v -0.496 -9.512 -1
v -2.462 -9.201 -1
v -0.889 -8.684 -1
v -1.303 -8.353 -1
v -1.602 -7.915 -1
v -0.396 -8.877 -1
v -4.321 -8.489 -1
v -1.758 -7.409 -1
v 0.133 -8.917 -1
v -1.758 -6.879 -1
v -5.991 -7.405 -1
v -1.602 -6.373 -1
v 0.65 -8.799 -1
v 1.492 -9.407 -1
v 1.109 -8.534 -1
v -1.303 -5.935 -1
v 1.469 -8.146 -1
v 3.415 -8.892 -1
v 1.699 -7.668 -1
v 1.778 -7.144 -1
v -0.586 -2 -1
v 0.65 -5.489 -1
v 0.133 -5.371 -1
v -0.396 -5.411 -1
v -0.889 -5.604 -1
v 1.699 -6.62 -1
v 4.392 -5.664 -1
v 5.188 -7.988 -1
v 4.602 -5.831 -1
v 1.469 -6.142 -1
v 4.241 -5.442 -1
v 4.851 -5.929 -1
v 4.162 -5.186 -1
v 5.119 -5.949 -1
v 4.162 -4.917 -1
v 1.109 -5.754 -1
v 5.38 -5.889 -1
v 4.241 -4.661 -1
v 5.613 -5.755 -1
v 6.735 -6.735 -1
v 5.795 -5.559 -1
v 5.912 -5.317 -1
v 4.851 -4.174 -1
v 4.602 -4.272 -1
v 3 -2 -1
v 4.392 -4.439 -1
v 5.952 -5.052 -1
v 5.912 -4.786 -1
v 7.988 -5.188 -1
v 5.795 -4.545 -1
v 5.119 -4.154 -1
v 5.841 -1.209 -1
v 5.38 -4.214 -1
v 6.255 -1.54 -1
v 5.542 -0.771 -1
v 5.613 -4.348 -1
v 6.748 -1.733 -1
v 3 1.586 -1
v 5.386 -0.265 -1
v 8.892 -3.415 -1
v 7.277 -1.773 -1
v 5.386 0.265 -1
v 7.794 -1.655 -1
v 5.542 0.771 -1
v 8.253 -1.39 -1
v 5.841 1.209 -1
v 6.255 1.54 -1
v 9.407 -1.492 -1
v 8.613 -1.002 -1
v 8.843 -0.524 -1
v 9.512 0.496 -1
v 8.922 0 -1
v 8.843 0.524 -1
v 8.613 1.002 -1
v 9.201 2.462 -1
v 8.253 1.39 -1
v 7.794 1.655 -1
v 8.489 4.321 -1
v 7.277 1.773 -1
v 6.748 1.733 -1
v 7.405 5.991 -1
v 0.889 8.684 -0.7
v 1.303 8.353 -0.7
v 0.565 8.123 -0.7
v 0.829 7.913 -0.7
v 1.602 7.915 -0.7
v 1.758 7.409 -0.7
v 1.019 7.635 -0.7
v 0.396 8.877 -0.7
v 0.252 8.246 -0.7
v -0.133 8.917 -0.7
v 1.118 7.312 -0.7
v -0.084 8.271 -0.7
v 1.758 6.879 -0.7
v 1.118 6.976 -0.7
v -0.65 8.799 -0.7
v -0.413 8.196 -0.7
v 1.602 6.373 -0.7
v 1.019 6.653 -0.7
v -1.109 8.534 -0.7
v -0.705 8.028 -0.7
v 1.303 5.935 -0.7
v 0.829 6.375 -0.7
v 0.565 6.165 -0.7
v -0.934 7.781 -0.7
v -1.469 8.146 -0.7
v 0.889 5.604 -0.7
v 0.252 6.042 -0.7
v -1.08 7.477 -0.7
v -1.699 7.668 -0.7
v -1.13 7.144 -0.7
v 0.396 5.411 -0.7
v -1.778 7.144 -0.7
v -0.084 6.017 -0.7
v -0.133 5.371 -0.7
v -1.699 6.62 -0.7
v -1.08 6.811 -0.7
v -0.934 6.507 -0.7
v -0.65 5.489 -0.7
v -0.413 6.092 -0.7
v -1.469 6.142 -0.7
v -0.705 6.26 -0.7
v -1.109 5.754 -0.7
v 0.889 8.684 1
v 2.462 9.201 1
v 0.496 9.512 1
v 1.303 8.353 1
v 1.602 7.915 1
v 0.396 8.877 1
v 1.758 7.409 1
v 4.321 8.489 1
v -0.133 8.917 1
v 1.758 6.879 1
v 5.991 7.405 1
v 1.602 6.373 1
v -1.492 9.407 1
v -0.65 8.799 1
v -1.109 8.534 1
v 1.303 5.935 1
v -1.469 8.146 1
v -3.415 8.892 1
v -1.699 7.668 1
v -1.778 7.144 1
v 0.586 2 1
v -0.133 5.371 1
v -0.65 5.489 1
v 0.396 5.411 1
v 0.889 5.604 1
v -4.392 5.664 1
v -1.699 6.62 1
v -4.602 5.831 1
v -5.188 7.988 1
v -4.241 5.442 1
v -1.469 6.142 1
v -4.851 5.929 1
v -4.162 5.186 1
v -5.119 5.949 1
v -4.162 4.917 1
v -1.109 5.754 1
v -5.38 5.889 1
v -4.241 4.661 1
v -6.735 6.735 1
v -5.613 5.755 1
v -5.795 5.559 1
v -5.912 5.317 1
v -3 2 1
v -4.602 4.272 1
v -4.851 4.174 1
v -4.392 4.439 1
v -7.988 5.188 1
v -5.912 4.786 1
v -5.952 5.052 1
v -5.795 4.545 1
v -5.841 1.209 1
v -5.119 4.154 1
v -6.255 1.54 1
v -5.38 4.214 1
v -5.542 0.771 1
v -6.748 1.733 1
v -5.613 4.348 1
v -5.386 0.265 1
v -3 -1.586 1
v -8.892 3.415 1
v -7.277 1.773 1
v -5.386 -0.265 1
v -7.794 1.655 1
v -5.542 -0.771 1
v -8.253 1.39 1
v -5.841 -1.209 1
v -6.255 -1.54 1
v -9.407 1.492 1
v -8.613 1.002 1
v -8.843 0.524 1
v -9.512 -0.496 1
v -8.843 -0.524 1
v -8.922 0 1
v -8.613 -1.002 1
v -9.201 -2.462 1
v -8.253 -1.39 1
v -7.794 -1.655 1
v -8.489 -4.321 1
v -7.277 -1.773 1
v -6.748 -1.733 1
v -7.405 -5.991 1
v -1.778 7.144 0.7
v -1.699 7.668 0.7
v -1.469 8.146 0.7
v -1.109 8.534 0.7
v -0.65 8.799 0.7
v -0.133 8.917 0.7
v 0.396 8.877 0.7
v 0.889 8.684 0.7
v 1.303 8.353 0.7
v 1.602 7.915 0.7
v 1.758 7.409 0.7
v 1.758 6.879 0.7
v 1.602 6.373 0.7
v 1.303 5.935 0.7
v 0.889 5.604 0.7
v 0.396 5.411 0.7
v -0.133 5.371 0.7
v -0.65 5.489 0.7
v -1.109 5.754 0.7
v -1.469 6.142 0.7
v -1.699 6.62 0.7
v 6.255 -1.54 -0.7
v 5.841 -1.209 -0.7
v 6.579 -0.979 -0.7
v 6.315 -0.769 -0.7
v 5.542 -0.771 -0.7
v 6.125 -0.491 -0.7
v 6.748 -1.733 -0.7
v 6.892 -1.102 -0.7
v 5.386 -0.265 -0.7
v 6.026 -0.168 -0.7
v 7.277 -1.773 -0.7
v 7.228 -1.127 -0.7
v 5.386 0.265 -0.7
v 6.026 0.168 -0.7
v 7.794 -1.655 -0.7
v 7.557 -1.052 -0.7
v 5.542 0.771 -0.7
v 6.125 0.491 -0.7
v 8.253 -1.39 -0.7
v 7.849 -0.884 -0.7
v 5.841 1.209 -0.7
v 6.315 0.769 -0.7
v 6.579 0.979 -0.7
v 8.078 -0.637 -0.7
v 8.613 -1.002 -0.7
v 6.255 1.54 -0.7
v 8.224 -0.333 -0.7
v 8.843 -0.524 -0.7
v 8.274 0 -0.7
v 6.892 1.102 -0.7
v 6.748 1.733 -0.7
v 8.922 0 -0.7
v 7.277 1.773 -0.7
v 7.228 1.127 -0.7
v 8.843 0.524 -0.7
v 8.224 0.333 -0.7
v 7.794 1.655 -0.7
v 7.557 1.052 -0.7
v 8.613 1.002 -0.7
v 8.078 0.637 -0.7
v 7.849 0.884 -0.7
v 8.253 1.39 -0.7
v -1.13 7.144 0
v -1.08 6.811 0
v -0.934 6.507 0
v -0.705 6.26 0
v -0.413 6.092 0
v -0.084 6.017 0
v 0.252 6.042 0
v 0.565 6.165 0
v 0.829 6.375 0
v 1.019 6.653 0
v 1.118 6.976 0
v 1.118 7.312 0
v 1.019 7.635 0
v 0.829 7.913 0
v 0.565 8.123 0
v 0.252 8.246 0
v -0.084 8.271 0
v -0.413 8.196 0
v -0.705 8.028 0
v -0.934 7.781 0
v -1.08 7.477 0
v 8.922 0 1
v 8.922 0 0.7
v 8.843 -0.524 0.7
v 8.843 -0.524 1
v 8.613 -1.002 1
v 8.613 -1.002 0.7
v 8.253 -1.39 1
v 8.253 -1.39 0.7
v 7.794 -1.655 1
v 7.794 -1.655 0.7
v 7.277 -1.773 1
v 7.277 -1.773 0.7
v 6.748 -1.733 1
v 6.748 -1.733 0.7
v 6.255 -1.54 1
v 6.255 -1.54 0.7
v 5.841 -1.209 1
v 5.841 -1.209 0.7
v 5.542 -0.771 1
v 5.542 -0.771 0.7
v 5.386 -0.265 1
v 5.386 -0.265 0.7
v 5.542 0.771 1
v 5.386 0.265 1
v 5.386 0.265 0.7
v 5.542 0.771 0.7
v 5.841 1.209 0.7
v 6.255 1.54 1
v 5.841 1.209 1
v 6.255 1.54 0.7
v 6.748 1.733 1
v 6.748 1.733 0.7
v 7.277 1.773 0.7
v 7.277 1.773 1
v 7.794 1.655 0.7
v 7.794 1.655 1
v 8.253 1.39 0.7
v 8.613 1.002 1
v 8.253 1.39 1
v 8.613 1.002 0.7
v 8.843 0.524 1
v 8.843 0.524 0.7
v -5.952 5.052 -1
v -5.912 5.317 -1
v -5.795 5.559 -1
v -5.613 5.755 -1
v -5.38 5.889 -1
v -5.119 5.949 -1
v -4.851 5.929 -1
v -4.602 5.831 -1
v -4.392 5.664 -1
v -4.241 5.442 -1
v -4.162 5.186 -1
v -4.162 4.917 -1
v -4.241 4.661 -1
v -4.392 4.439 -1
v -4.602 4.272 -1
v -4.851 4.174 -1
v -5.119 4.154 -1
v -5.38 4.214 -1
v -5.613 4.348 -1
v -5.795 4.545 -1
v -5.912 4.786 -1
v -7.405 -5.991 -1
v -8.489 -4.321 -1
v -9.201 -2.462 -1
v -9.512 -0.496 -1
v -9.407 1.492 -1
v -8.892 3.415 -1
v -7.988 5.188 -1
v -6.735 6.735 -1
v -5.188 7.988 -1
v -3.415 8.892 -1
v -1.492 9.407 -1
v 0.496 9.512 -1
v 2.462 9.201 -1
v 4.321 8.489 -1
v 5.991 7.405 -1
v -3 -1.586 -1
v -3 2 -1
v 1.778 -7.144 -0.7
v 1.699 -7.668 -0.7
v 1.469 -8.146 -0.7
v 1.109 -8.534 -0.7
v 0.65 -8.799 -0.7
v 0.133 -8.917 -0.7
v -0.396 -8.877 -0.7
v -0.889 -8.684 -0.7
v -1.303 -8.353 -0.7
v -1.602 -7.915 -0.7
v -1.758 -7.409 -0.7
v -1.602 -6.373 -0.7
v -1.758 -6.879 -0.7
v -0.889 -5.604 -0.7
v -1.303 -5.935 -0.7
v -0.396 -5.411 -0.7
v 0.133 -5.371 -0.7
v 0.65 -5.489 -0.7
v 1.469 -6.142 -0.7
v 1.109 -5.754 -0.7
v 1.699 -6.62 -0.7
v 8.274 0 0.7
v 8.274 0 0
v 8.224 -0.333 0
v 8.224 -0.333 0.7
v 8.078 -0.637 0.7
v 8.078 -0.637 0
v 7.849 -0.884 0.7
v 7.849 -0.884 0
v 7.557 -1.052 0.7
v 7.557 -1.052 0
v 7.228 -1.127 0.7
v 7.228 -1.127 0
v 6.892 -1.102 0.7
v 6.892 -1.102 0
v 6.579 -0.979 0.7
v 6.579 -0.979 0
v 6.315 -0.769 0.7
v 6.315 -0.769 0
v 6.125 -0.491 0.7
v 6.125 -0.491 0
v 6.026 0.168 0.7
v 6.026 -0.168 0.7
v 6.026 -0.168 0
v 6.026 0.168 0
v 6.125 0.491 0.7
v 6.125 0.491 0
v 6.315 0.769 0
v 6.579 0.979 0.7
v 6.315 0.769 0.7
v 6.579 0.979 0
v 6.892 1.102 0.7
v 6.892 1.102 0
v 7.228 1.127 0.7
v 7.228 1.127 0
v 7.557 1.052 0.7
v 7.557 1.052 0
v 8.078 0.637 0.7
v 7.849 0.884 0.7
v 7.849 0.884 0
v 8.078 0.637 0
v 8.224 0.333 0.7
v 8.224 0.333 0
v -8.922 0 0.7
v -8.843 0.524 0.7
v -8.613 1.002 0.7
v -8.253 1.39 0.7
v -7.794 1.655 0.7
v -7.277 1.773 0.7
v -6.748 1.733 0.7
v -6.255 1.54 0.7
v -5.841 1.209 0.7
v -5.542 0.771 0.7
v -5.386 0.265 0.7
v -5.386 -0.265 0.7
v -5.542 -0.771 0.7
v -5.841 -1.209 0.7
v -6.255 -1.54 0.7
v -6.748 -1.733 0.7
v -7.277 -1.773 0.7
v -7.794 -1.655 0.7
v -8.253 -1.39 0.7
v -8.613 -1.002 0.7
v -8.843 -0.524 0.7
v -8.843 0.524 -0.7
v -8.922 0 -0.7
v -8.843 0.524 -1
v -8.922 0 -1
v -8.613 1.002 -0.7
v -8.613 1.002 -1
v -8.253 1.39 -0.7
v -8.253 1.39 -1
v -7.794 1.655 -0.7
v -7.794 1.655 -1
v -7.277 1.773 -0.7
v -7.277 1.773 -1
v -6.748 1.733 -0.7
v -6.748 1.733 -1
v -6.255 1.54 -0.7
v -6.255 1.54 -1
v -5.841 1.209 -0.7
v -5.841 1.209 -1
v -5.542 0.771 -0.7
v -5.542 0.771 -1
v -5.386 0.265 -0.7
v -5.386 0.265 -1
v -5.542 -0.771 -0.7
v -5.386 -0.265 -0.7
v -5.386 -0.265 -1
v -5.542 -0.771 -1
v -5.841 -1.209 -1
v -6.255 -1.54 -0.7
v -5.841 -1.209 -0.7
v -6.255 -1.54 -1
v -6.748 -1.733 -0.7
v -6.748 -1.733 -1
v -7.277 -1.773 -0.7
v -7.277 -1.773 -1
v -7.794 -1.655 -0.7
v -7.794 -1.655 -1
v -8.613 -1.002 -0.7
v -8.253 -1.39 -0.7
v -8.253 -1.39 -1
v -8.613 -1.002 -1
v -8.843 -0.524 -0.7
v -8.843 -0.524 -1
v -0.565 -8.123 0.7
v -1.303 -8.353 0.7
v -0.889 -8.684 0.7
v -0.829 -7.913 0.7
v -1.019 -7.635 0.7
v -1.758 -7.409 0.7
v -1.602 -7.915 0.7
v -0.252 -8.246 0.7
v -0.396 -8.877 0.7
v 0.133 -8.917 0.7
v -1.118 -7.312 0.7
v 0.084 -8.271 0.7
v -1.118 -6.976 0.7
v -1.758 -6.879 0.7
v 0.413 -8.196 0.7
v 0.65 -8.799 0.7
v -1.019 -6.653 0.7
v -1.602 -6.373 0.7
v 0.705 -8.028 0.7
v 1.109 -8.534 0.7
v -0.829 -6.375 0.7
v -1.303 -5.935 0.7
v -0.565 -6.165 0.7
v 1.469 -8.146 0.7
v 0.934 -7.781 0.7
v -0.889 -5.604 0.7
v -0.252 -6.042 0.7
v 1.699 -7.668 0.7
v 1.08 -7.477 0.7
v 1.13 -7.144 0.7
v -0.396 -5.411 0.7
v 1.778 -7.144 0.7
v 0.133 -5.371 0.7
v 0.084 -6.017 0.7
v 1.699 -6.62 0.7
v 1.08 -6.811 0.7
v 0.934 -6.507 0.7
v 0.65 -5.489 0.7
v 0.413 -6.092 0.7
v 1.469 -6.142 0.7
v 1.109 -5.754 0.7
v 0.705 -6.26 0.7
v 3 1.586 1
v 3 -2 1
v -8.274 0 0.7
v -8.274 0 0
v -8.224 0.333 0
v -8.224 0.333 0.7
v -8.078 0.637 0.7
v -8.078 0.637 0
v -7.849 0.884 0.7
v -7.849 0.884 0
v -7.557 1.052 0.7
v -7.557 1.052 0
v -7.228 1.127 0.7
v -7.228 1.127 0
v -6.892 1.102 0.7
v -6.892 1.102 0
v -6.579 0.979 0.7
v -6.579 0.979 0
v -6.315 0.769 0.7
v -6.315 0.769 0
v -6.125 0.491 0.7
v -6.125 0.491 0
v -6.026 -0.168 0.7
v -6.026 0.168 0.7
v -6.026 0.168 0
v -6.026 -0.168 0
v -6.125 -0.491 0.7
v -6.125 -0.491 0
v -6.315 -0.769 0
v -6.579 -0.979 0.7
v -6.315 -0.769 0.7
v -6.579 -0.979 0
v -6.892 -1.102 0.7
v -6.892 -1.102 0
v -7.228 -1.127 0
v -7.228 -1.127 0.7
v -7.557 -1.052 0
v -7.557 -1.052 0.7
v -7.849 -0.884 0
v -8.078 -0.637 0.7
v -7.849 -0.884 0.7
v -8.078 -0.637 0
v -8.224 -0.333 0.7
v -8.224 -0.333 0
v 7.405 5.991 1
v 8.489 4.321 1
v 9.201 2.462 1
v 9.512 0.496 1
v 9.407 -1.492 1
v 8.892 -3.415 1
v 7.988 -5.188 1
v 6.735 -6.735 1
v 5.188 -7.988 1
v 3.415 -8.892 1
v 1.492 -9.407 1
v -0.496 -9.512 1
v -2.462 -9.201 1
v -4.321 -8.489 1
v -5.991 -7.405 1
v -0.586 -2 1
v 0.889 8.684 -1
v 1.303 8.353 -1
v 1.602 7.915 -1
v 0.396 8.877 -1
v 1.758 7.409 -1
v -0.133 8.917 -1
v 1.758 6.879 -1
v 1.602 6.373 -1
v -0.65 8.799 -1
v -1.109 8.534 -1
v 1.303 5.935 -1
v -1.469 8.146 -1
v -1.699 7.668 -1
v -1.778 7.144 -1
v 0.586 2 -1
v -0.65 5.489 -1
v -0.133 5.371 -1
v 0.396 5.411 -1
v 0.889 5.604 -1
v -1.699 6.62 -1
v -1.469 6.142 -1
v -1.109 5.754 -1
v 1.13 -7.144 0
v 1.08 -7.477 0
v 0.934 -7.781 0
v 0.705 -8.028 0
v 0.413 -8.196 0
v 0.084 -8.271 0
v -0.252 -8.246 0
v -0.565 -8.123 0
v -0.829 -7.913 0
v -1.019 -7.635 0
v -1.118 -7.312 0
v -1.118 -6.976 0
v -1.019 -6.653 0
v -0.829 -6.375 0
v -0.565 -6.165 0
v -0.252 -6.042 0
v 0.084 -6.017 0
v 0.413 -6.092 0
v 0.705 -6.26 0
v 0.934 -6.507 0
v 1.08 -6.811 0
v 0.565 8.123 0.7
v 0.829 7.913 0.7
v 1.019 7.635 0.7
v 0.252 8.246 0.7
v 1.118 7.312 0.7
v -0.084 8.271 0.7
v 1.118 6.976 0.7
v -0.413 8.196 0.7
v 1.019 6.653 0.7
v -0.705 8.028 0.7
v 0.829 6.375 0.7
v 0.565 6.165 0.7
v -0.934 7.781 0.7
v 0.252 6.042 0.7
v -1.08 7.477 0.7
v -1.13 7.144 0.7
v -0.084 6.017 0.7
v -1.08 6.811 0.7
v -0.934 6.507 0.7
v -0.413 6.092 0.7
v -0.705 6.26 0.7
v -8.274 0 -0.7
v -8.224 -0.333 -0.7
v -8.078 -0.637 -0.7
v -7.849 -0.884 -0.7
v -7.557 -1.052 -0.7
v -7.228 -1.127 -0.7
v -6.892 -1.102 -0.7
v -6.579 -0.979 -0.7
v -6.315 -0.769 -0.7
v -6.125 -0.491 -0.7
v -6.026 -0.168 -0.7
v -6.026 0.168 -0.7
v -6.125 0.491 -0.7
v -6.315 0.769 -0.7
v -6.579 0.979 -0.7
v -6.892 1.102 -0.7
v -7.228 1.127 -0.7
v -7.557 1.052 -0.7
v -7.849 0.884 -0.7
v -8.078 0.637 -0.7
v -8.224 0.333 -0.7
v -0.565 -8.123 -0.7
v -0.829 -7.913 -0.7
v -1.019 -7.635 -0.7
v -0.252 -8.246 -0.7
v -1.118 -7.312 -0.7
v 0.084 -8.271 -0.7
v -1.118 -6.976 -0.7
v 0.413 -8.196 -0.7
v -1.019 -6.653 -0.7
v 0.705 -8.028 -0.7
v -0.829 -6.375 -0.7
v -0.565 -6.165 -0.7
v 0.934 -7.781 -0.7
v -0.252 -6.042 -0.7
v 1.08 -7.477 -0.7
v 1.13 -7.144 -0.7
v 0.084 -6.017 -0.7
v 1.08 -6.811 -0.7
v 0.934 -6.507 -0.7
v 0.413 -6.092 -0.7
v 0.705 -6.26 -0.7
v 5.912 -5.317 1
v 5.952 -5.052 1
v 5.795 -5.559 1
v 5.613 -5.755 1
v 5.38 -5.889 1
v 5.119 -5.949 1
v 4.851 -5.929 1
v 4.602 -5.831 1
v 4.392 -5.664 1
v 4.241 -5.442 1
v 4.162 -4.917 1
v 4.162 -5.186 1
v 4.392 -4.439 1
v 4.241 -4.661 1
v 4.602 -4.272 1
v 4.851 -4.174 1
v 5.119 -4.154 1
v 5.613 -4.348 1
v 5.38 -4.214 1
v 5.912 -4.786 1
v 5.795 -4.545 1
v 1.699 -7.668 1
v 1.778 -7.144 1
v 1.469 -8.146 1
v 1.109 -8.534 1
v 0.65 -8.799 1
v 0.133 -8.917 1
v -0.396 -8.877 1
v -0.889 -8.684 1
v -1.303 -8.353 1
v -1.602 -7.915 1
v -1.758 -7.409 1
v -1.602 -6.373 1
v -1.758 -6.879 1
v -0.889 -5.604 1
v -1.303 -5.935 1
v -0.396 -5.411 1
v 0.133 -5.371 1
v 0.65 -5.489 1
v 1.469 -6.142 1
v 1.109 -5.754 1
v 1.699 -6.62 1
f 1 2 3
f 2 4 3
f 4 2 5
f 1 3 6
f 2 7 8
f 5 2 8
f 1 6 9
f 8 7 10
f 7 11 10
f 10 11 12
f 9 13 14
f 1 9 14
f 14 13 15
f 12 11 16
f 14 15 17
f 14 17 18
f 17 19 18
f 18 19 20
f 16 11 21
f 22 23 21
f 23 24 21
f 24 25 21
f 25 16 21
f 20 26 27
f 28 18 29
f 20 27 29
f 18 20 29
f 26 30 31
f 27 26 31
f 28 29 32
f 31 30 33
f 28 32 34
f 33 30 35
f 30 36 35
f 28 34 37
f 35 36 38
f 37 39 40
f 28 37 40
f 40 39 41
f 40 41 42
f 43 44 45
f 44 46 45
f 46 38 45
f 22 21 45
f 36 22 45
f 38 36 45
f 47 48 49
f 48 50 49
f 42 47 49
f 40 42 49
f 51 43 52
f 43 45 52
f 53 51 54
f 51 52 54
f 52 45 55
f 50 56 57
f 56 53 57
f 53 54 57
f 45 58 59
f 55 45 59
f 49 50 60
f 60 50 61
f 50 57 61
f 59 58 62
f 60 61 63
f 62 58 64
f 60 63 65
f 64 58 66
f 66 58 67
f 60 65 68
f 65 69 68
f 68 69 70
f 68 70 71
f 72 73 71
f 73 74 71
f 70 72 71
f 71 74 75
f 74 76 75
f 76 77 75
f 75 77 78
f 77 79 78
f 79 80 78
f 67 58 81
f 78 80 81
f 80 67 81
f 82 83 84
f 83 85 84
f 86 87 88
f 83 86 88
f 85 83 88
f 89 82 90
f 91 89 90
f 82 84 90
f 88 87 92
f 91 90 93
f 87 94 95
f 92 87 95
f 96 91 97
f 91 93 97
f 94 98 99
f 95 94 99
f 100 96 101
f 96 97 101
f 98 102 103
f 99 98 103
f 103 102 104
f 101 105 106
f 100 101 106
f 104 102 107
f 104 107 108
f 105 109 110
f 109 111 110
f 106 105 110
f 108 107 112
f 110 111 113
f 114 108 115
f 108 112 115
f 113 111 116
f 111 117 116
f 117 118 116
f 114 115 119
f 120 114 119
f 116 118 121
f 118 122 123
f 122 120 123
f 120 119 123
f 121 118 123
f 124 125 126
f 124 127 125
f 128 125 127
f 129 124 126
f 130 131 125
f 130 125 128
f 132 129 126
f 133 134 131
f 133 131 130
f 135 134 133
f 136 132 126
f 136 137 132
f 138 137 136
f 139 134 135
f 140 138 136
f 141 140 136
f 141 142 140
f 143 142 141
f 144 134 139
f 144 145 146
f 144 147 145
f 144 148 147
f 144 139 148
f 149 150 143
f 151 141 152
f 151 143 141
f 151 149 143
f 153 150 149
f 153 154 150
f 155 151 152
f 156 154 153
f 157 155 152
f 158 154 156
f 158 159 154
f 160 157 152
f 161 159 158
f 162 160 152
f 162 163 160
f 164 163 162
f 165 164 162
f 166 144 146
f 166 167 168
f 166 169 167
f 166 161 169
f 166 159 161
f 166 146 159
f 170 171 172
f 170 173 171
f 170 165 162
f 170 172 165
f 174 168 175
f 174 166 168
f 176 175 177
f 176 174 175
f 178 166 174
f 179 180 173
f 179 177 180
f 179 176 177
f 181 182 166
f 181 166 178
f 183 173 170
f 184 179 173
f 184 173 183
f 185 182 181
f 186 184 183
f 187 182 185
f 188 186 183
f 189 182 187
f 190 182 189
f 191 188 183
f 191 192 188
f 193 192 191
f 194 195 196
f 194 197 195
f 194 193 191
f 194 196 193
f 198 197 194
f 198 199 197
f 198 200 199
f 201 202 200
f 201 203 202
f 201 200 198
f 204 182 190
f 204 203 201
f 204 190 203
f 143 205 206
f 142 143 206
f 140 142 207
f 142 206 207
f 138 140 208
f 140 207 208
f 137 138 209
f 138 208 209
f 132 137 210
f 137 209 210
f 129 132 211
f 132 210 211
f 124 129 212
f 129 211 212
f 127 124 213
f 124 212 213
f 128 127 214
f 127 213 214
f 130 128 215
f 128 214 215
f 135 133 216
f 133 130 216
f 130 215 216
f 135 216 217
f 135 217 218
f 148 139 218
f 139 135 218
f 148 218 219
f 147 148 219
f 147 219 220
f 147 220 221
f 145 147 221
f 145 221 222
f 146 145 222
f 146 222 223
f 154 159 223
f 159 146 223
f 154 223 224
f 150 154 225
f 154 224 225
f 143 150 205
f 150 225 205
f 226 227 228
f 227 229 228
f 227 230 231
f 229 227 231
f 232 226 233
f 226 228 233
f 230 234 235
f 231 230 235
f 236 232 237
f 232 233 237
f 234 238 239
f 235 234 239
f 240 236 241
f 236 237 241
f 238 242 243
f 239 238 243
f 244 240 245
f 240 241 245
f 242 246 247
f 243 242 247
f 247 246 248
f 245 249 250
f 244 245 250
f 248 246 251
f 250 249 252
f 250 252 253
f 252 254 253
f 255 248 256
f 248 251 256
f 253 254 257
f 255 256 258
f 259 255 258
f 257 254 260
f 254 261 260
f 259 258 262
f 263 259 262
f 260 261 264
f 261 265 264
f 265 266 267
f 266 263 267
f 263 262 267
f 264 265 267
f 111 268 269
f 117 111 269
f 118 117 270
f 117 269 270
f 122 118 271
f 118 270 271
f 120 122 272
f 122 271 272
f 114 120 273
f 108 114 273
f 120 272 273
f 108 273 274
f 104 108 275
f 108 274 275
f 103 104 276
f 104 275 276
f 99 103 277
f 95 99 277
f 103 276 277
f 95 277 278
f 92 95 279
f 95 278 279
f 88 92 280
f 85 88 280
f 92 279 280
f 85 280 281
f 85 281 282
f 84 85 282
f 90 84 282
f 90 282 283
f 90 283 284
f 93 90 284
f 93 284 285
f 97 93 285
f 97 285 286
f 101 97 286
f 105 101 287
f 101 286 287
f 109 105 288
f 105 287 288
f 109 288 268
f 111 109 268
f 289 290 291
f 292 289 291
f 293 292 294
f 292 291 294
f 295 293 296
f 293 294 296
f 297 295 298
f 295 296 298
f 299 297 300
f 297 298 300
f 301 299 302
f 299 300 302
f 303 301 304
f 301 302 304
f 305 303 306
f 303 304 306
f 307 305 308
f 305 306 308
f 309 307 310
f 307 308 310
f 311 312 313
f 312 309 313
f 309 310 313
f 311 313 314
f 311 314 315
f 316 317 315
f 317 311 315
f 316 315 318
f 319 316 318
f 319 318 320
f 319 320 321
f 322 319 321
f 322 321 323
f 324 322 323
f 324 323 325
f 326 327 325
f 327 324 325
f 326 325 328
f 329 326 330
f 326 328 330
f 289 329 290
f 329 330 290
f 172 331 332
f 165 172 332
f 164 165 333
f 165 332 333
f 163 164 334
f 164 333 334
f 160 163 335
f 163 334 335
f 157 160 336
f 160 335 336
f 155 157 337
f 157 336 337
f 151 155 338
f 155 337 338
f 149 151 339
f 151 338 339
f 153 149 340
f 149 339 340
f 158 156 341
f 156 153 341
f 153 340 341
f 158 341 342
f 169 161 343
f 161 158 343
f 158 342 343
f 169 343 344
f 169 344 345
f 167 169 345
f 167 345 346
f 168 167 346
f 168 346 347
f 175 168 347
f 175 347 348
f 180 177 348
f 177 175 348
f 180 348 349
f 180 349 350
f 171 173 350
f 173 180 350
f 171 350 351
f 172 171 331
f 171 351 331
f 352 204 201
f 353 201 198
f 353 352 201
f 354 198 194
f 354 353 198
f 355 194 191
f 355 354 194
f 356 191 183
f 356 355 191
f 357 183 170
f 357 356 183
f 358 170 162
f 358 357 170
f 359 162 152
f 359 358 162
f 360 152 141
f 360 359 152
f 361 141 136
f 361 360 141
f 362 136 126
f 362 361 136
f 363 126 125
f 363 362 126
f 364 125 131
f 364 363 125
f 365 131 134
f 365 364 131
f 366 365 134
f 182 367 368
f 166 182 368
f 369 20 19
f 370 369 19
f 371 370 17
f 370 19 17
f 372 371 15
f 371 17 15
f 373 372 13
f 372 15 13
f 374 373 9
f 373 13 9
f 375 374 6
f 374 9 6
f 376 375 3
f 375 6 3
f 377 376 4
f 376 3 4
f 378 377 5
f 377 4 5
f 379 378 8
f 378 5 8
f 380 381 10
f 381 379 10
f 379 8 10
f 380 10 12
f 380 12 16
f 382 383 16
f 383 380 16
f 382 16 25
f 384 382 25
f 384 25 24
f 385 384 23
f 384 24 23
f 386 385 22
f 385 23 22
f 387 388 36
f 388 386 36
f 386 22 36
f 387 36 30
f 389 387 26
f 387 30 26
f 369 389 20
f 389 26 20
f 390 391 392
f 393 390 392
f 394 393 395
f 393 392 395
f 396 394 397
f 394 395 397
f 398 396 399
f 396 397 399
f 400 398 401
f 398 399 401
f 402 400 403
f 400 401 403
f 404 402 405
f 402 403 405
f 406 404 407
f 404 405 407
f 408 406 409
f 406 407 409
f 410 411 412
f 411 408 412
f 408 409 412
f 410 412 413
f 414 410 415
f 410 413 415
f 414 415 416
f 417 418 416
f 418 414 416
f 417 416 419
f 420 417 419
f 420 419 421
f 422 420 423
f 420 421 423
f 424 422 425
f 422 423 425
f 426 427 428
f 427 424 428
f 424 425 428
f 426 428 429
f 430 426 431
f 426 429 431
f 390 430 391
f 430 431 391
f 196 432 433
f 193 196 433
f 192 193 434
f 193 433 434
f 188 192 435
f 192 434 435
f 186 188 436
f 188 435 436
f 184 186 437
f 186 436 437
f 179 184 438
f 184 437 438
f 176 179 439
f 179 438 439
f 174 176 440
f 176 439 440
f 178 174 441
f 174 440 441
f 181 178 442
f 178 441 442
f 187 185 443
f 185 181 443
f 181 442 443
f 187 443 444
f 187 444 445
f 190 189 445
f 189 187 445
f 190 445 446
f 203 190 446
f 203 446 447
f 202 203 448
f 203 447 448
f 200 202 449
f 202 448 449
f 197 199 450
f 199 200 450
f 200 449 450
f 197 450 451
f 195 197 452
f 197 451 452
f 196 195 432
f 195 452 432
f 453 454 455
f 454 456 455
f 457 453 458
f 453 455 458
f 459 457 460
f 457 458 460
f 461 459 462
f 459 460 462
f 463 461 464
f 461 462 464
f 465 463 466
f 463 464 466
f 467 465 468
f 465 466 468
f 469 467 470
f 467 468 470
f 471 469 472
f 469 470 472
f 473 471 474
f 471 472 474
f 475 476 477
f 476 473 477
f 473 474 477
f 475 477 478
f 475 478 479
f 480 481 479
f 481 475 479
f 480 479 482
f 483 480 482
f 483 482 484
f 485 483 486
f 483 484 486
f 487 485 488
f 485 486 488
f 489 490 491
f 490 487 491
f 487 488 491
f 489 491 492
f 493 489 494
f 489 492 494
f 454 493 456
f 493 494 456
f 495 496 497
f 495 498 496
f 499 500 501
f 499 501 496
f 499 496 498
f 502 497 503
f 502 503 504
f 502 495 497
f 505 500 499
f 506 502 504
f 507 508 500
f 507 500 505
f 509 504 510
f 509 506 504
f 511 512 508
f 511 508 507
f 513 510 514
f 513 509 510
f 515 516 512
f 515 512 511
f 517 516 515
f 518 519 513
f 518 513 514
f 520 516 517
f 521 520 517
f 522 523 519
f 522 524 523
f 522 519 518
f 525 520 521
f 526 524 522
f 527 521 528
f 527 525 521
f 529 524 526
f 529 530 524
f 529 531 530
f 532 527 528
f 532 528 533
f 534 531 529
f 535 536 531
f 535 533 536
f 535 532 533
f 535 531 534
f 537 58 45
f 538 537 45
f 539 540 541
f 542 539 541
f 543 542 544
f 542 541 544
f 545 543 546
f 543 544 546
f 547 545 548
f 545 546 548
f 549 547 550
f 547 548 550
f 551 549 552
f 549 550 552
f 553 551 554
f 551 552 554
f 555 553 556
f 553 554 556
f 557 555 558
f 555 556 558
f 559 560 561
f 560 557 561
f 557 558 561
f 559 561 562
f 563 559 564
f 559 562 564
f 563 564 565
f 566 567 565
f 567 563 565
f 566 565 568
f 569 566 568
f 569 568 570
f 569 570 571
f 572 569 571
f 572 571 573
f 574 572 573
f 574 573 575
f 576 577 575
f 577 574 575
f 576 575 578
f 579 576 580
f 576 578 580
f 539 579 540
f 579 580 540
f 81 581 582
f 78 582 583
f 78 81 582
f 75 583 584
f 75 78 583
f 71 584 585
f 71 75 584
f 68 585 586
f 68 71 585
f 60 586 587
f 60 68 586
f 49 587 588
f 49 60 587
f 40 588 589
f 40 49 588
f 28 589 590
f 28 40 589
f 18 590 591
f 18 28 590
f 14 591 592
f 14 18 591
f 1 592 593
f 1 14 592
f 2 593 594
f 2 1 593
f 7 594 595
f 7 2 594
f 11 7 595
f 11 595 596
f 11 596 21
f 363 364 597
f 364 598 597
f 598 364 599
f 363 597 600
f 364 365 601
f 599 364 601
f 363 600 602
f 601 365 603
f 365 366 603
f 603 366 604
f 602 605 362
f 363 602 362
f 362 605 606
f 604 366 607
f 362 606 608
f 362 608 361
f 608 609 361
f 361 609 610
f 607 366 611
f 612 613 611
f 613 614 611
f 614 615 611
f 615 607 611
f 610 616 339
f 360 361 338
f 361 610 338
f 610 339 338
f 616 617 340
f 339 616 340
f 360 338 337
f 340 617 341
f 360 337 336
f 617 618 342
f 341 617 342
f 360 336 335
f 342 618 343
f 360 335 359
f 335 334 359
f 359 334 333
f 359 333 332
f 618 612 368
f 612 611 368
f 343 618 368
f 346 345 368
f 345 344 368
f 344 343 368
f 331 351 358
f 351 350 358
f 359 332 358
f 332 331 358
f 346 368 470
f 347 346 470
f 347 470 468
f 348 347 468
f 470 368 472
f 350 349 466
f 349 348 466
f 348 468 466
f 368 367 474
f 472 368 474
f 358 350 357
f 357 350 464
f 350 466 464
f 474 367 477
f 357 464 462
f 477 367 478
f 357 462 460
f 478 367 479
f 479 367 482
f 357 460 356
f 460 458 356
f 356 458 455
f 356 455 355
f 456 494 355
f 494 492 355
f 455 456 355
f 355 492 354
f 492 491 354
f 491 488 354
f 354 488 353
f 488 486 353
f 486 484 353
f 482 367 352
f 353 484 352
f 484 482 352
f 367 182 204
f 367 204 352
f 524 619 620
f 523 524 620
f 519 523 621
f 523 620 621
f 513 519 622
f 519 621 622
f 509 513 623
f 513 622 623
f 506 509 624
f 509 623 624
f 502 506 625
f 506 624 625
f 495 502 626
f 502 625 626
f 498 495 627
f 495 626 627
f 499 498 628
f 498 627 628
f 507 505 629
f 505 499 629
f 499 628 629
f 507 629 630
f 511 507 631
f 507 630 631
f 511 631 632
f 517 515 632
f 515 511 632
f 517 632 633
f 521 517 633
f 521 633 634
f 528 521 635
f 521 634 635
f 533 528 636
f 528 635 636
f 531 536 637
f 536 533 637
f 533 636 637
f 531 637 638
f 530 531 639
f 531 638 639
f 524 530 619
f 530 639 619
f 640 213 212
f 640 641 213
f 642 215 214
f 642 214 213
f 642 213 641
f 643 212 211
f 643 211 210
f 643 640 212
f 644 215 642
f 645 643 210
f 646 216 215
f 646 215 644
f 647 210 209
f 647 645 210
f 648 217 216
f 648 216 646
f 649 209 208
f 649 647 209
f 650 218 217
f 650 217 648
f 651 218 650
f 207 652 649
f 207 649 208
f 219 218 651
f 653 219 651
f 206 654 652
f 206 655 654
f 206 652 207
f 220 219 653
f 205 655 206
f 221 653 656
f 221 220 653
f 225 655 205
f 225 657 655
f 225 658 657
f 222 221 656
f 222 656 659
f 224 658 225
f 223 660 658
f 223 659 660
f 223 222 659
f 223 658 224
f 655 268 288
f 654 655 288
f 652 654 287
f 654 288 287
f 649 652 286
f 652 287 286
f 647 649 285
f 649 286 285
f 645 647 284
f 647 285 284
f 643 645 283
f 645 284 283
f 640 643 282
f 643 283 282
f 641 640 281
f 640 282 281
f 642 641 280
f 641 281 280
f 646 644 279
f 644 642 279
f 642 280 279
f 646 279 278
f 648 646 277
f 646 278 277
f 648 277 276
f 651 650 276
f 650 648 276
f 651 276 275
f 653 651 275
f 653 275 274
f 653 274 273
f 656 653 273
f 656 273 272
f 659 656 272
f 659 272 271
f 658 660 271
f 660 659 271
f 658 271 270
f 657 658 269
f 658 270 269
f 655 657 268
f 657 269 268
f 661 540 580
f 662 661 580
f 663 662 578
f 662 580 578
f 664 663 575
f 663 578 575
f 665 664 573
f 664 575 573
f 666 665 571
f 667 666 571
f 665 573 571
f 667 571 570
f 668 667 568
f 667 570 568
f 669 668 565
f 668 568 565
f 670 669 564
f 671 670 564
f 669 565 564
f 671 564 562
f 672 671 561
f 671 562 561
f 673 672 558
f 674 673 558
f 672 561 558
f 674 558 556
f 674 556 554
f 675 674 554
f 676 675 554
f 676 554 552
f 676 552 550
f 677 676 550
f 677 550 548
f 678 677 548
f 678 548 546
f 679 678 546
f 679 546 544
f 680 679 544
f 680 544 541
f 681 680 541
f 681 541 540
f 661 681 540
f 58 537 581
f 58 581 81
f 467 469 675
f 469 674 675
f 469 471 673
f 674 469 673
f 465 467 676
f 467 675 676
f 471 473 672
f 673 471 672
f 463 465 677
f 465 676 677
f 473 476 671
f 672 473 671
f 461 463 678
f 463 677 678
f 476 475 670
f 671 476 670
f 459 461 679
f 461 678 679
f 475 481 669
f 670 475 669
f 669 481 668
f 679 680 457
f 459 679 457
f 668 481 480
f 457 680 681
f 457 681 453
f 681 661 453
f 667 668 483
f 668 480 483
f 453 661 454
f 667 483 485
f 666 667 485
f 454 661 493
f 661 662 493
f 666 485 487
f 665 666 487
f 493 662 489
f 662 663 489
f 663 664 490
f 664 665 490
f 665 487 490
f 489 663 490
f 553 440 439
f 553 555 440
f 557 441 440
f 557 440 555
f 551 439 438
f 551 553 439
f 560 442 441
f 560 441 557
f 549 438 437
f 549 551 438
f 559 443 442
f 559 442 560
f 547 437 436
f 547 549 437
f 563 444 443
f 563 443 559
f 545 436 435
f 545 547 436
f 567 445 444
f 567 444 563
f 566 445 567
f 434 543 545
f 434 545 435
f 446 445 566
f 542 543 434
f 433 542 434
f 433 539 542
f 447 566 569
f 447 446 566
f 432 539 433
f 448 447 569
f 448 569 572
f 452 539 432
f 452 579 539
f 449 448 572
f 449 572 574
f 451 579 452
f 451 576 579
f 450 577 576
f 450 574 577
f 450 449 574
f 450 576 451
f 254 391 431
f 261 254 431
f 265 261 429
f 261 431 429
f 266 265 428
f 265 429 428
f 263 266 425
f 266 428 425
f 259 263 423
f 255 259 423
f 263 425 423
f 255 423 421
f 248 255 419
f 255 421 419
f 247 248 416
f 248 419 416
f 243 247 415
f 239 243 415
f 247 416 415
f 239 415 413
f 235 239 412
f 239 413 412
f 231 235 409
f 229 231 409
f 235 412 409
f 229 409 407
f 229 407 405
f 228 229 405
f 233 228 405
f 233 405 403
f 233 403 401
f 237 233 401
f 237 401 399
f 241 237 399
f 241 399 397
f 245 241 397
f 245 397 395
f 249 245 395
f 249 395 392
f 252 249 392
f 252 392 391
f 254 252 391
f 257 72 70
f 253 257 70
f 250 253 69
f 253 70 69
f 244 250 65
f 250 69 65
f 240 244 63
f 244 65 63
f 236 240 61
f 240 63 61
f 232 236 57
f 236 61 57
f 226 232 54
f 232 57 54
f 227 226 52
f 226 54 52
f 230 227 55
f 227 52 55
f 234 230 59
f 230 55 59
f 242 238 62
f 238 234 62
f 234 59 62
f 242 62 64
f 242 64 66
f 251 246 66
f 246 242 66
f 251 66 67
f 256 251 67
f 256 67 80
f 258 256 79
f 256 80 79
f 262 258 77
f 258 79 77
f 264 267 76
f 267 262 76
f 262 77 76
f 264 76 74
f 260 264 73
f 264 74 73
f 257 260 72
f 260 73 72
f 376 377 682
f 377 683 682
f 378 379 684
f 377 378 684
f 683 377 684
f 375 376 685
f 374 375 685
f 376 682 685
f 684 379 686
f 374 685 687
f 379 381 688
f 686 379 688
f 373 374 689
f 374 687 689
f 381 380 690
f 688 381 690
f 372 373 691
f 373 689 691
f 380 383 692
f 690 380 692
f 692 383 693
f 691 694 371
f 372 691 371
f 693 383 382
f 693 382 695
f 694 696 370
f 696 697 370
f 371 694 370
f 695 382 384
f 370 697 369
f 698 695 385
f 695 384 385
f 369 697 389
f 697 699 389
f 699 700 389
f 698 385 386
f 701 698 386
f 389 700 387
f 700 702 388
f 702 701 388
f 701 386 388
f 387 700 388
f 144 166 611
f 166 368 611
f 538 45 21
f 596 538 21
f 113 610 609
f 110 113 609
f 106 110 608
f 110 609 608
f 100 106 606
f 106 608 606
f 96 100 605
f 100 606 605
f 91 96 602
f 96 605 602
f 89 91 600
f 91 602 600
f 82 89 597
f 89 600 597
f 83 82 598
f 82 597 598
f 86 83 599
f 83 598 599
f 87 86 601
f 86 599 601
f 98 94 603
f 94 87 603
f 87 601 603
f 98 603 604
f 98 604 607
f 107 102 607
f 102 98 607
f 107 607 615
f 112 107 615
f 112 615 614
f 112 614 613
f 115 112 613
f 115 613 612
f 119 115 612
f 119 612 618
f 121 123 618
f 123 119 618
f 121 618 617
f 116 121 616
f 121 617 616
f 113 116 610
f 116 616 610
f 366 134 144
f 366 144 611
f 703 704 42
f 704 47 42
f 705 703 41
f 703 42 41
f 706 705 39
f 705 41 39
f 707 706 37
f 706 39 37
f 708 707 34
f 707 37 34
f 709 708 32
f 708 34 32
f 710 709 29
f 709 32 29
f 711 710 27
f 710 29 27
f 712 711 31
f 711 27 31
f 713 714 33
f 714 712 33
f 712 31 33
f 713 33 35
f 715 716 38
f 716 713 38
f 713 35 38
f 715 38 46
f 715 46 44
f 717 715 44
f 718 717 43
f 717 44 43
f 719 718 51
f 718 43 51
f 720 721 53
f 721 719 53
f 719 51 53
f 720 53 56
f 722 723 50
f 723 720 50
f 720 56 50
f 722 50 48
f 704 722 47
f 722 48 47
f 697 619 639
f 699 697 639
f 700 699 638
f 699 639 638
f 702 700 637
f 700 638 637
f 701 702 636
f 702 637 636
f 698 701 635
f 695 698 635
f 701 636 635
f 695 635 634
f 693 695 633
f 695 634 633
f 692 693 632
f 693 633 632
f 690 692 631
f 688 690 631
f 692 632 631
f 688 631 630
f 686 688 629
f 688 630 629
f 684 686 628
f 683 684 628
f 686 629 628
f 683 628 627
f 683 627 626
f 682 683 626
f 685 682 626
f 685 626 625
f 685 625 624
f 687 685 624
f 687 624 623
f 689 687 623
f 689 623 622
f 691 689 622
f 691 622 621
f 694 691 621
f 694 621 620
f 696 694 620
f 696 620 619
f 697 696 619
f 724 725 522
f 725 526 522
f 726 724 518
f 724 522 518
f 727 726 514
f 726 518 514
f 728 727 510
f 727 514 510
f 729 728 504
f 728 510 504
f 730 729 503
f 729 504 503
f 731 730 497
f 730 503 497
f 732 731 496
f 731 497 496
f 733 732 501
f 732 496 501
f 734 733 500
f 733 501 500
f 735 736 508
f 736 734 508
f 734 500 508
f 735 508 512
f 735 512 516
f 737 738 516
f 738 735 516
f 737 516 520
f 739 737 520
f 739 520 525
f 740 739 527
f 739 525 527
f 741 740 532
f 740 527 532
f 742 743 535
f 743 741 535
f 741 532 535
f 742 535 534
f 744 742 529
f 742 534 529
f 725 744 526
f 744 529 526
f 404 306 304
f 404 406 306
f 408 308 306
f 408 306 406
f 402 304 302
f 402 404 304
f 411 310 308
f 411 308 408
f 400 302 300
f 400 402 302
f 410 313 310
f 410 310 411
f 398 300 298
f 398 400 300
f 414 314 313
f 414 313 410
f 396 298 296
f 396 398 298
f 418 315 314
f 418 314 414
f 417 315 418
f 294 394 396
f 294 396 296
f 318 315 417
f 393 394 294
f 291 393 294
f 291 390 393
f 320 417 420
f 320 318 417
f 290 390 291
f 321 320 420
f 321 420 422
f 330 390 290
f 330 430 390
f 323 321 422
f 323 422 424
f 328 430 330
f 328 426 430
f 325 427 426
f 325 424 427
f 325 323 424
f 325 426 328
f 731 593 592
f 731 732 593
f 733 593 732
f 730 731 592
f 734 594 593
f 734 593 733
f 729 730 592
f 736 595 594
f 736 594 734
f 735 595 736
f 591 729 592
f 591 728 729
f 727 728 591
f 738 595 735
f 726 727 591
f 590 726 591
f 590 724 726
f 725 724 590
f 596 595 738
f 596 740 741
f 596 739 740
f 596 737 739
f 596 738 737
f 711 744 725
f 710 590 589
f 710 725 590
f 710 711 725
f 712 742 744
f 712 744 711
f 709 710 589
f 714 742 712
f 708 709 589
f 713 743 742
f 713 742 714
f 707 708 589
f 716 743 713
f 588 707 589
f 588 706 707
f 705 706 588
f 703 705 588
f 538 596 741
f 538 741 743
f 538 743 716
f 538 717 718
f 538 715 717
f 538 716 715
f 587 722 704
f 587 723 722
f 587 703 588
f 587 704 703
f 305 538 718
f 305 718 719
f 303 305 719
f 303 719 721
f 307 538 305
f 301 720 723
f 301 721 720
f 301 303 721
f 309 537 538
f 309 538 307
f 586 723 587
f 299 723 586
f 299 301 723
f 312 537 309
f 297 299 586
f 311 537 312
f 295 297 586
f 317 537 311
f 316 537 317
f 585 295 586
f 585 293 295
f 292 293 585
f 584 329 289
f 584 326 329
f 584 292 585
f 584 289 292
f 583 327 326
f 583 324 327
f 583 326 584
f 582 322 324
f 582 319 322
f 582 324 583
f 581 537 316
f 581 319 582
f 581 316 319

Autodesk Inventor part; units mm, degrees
ref_plane "YZ Plane" through (0, 0, 0) normal (1, 0, 0) x (0, 1, 0)
ref_plane "XZ Plane" through (0, 0, 0) normal (0, 1, 0) x (-1, 0, 0)
sketch "S-Flansch" plane through (0, 0, 0) normal (0, 0, 1) x (1, 0, 0)
  circle A0 centre (0, 0) radius 9.525
  circle A1 centre (0, 0) radius 7.144 construction
  circle A2 centre (0, 7.144) radius 1.1305
  circle A3 centre (0, 7.144) radius 1.778
  line L0 (0, 0) -> (5.0516, 5.0516) construction
  line L1 (0, 13.335) -> (0, -13.335) construction
  circle A4 centre (5.0516, 5.0516) radius 0.9
  circle A5 centre (-7.144, 0) radius 1.1305
  circle A6 centre (-7.144, 0) radius 1.778
  circle A7 centre (-5.0516, 5.0516) radius 0.9
  circle A8 centre (0, -7.144) radius 1.1305
  circle A9 centre (0, -7.144) radius 1.778
  circle A10 centre (-5.0516, -5.0516) radius 0.9
  circle A11 centre (7.144, 0) radius 1.1305
  circle A12 centre (7.144, 0) radius 1.778
  circle A13 centre (5.0516, -5.0516) radius 0.9
  line L2 (-3, 2) -> (3, 2)
  line L3 (3, 2) -> (3, -2)
  line L4 (3, -2) -> (-3, -2)
  line L5 (-3, -2) -> (-3, 2)
  line L6 (-3, 2) -> (3, -2) construction
  line L7 (3, 2) -> (-3, -2) construction
  line L8 (-1.8795, 0.94) -> (1.8795, 0.94)
  line L9 (1.8795, 0.94) -> (1.8795, -0.94)
  line L10 (1.8795, -0.94) -> (-1.8795, -0.94)
  line L11 (-1.8795, -0.94) -> (-1.8795, 0.94)
  line L12 (-1.8795, 0.94) -> (1.8795, -0.94) construction
  line L13 (1.8795, 0.94) -> (-1.8795, -0.94) construction
  dimension "d0" = 19.05
  dimension "d1" = 14.288
  dimension "d2" = 2.261
  dimension "d3" = 3.556
  dimension "d4" = 45
  dimension "d5" = 1.8
  dimension "d8" = 360
  dimension "d10" = 6
  dimension "d11" = 4
  dimension "d16" = 3.759
  dimension "d17" = 1.88
extrude "Ex-Flansch1" add sketch "S-Flansch" along normal mid plane 2 contours A0
ref_plane "Schnittebene" through (0.7071, -0.7071, 0) normal (0.7071068, -0.7071068, 0) x (0.7071068, 0.7071068, 0)
ref_plane "Querebene" through (0, 0, 0) normal (0.7071068, -0.7071068, 0) x (0.7071068, 0.7071068, 0)
split "Trennen-Schnitt" plane through (0.7071, -0.7071, 0) removes the side toward (-0.7071068, 0.7071068, 0)
extrude "Ex-Flansch2-Innengewinde" add sketch "S-Flansch" along normal mid plane 1.4 contours A9 | A12
pattern_circular "Runde Anordnung1" count 2 over 360 about axis through (0, 0, -10) along (0, 0, 1)
surface extrude "RWG-V-Band" sketch "S-Flansch" along normal mid plane 2 shown yes curves L9 L10 L11 L8
properties part number "RWG-V_Band Backingplate"
